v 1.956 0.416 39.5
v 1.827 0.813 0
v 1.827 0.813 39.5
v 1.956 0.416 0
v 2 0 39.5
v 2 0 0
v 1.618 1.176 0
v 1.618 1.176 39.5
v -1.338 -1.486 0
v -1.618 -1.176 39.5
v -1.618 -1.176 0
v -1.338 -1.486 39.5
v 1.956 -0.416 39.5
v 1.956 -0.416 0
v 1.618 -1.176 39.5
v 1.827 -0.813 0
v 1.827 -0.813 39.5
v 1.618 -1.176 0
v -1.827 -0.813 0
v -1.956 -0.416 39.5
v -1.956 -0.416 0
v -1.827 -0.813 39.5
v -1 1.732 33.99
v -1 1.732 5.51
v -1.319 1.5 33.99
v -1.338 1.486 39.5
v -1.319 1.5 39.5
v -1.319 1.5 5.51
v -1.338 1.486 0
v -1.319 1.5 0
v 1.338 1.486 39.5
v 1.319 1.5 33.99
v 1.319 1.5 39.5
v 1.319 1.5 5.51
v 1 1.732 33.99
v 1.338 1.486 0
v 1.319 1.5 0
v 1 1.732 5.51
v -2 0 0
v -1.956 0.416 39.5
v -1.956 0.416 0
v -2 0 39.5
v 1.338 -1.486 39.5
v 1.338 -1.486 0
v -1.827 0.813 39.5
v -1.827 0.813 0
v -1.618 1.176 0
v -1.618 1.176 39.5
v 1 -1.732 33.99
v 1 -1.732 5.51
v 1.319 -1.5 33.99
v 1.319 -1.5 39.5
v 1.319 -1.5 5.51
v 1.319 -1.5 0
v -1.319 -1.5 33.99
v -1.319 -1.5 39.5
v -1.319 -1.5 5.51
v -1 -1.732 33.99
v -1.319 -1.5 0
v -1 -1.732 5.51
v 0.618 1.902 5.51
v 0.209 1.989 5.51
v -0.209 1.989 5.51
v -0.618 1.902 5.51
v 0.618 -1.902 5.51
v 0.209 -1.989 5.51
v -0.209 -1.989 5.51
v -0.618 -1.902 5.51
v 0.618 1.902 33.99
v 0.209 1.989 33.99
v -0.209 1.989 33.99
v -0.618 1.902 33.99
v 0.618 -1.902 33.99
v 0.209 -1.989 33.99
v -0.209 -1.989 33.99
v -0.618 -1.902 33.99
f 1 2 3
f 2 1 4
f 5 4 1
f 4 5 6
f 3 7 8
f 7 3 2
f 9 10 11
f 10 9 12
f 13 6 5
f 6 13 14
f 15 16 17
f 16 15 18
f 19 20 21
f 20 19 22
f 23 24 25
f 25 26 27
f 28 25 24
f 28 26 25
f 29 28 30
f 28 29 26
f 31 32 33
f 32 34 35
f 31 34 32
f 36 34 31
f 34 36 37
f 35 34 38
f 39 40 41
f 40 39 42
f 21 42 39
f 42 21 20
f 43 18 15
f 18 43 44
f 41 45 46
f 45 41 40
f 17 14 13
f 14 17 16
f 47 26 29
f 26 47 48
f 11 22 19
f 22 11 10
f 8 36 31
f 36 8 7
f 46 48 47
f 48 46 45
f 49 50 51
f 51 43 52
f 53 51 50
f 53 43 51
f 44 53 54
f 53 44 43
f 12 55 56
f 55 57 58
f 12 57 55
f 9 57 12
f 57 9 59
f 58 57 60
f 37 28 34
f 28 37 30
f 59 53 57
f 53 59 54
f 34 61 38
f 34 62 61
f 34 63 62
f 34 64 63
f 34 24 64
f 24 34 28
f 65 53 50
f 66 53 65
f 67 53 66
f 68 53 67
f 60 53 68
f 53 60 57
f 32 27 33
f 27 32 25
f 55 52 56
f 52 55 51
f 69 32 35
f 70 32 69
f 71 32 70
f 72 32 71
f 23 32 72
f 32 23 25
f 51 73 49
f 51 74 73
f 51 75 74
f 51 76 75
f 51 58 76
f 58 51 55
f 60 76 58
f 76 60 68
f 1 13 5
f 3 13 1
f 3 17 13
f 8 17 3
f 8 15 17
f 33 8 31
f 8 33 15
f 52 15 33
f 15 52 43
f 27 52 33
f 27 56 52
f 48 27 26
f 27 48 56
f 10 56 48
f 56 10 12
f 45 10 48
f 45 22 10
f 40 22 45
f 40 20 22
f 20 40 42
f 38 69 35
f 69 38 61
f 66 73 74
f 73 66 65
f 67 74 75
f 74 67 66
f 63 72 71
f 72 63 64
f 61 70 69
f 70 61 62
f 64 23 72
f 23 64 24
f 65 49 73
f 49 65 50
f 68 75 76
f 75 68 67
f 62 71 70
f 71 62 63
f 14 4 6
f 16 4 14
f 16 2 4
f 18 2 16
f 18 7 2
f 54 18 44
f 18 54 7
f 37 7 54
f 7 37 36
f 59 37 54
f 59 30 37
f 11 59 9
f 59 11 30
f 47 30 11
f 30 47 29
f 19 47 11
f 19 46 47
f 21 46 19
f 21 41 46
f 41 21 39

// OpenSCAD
/**
  * Module: Placeholder for the suspension arm pin
  *
  * Author: Karim Aziiev <karim.aziiev@gmail.com>
  * License: GPL-3.0-or-later
  */
include <../colors.scad>

use <../lib/functions.scad>
use <../lib/shapes3d.scad>
use <../lib/transforms.scad>
use <e_clip.scad>

/**
  ─────────────────────────────────────────────────────────────────────────────
  suspension_arm_pin
  ─────────────────────────────────────────────────────────────────────────────

  Model a cylindrical pin with optional end flats and retaining-clip grooves.

  **Parameters:**
  - `d`, `l`: Full pin diameter and length, with the axis at X=Y=0 and Z=0..l.
  - `fn`: Fragment count; defaults to 30.
  - `color`: Hardware color.
  - `show_e_clip`: Display retaining clips at the selected groove positions.
  - `e_clip_thickness`: Clip thickness used to center clips within the grooves.
  - `groove_d`: Groove root diameter; defaults to `d - 0.4`.
  - `groove_side`: `"top"`, `"bottom"`, or `"all"` selects grooved ends.
  - `pad_side`: `"top"`, `"bottom"`, or `"all"` selects flattened ends;
    other values omit flats.
  - `pad_horizontal_one_side`: Cut only +Y when true; otherwise cut opposing flats.
  - `pad_l`: Flat length at each selected end; zero or `undef` omits flats.
  - `pad_w`: Remaining Y thickness of the flattened profile; zero or `undef`
    omits flats. A single flat is measured from the original -Y tangent.
  - `groove_w`: Groove axial width; defaults to 0.4.
  - `groove_offset`: End-to-groove edge distance; zero or `undef` omits grooves.

  Flats preserve the full pin length and do not fill grooves that cross them.
 */
module suspension_arm_pin(d,
                          l,
                          fn,
                          color=metallic_silver_1,
                          show_e_clip=false,
                          e_clip_thickness=0.4,
                          groove_d,
                          groove_side="all", // "top" | "bottom" | "all"
                          pad_side="all",    // "top" | "bottom" | "all"
                          pad_horizontal_one_side=false,
                          pad_l,
                          pad_w,
                          groove_w,
                          groove_offset) {
  fn = is_undef(fn) ? 30 : fn;
  pad_l = with_default(pad_l, 0);
  pad_w = with_default(pad_w, 0);

  is_all = groove_side == "all";
  is_bottom = groove_side == "bottom";

  pad_is_all = pad_side == "all";
  pad_is_bottom = pad_side == "bottom";
  pad_is_top = pad_side == "top";

  groove_d = with_default(groove_d, d - 0.4);
  groove_w = with_default(groove_w, 0.4);

  // Cut the flats from the complete pin so single-end and disabled pads
  // retain the full length, and grooves remain present inside the pads.
  module _with_pad() {
    difference() {
      children();
      if (pad_l > 0 && pad_w > 0) {
        for (bottom = [true, false]) {
          if (pad_is_all || (bottom ? pad_is_bottom : pad_is_top)) {
            translate([0, 0, bottom ? 0 : l - pad_l]) {
              difference() {
                translate([-d, -d, -0.01]) {
                  cube([2 * d, 2 * d, pad_l + 0.02]);
                }
                translate([0, 0, -0.02]) {
                  flatted_cyl(d=d,
                              h=pad_l + 0.04,
                              flat_d=pad_w,
                              both_sides=!pad_horizontal_one_side,
                              $fn=fn,
                              color=color);
                }
              }
            }
          }
        }
      }
    }
  }

  module _main() {
    color(color, alpha=1) {
      cylinder(d=d, h=l, $fn=fn);
    }
  }

  if (is_undef(groove_offset) || groove_offset == 0) {
    _with_pad() {
      _main();
    }
  } else {
    z_top = l - groove_offset - groove_w;
    z = (is_all || is_bottom) ? groove_offset : z_top;
    union() {
      _with_pad() {
        difference() {
          _main();

          translate([0, 0, z]) {
            ring(od=d + 1, d=groove_d, h=groove_w);
          }
          if (is_all) {
            translate([0, 0, z_top]) {
              ring(od=d + 1, d=groove_d, h=groove_w);
            }
          }
        }
      }

      if (show_e_clip) {
        if (is_all || is_bottom) {
          translate([0,
                     0,
                     groove_offset + (groove_w - e_clip_thickness) / 2]) {
            e_clip(d, thickness=e_clip_thickness);
          }
        }
        if (is_all || !is_bottom) {
          translate([0,
                     0,
                     l - groove_offset - (groove_w + e_clip_thickness) / 2]) {
            e_clip(d, thickness=e_clip_thickness);
          }
        }
      }
    }
  }
}

suspension_arm_pin(d=4,
                   l=39.5,
                   pad_l=5.5,
                   pad_w=3.0,
                   pad_side="all",
                   color=undef,
                   groove_side="all",
                   show_e_clip=false);
